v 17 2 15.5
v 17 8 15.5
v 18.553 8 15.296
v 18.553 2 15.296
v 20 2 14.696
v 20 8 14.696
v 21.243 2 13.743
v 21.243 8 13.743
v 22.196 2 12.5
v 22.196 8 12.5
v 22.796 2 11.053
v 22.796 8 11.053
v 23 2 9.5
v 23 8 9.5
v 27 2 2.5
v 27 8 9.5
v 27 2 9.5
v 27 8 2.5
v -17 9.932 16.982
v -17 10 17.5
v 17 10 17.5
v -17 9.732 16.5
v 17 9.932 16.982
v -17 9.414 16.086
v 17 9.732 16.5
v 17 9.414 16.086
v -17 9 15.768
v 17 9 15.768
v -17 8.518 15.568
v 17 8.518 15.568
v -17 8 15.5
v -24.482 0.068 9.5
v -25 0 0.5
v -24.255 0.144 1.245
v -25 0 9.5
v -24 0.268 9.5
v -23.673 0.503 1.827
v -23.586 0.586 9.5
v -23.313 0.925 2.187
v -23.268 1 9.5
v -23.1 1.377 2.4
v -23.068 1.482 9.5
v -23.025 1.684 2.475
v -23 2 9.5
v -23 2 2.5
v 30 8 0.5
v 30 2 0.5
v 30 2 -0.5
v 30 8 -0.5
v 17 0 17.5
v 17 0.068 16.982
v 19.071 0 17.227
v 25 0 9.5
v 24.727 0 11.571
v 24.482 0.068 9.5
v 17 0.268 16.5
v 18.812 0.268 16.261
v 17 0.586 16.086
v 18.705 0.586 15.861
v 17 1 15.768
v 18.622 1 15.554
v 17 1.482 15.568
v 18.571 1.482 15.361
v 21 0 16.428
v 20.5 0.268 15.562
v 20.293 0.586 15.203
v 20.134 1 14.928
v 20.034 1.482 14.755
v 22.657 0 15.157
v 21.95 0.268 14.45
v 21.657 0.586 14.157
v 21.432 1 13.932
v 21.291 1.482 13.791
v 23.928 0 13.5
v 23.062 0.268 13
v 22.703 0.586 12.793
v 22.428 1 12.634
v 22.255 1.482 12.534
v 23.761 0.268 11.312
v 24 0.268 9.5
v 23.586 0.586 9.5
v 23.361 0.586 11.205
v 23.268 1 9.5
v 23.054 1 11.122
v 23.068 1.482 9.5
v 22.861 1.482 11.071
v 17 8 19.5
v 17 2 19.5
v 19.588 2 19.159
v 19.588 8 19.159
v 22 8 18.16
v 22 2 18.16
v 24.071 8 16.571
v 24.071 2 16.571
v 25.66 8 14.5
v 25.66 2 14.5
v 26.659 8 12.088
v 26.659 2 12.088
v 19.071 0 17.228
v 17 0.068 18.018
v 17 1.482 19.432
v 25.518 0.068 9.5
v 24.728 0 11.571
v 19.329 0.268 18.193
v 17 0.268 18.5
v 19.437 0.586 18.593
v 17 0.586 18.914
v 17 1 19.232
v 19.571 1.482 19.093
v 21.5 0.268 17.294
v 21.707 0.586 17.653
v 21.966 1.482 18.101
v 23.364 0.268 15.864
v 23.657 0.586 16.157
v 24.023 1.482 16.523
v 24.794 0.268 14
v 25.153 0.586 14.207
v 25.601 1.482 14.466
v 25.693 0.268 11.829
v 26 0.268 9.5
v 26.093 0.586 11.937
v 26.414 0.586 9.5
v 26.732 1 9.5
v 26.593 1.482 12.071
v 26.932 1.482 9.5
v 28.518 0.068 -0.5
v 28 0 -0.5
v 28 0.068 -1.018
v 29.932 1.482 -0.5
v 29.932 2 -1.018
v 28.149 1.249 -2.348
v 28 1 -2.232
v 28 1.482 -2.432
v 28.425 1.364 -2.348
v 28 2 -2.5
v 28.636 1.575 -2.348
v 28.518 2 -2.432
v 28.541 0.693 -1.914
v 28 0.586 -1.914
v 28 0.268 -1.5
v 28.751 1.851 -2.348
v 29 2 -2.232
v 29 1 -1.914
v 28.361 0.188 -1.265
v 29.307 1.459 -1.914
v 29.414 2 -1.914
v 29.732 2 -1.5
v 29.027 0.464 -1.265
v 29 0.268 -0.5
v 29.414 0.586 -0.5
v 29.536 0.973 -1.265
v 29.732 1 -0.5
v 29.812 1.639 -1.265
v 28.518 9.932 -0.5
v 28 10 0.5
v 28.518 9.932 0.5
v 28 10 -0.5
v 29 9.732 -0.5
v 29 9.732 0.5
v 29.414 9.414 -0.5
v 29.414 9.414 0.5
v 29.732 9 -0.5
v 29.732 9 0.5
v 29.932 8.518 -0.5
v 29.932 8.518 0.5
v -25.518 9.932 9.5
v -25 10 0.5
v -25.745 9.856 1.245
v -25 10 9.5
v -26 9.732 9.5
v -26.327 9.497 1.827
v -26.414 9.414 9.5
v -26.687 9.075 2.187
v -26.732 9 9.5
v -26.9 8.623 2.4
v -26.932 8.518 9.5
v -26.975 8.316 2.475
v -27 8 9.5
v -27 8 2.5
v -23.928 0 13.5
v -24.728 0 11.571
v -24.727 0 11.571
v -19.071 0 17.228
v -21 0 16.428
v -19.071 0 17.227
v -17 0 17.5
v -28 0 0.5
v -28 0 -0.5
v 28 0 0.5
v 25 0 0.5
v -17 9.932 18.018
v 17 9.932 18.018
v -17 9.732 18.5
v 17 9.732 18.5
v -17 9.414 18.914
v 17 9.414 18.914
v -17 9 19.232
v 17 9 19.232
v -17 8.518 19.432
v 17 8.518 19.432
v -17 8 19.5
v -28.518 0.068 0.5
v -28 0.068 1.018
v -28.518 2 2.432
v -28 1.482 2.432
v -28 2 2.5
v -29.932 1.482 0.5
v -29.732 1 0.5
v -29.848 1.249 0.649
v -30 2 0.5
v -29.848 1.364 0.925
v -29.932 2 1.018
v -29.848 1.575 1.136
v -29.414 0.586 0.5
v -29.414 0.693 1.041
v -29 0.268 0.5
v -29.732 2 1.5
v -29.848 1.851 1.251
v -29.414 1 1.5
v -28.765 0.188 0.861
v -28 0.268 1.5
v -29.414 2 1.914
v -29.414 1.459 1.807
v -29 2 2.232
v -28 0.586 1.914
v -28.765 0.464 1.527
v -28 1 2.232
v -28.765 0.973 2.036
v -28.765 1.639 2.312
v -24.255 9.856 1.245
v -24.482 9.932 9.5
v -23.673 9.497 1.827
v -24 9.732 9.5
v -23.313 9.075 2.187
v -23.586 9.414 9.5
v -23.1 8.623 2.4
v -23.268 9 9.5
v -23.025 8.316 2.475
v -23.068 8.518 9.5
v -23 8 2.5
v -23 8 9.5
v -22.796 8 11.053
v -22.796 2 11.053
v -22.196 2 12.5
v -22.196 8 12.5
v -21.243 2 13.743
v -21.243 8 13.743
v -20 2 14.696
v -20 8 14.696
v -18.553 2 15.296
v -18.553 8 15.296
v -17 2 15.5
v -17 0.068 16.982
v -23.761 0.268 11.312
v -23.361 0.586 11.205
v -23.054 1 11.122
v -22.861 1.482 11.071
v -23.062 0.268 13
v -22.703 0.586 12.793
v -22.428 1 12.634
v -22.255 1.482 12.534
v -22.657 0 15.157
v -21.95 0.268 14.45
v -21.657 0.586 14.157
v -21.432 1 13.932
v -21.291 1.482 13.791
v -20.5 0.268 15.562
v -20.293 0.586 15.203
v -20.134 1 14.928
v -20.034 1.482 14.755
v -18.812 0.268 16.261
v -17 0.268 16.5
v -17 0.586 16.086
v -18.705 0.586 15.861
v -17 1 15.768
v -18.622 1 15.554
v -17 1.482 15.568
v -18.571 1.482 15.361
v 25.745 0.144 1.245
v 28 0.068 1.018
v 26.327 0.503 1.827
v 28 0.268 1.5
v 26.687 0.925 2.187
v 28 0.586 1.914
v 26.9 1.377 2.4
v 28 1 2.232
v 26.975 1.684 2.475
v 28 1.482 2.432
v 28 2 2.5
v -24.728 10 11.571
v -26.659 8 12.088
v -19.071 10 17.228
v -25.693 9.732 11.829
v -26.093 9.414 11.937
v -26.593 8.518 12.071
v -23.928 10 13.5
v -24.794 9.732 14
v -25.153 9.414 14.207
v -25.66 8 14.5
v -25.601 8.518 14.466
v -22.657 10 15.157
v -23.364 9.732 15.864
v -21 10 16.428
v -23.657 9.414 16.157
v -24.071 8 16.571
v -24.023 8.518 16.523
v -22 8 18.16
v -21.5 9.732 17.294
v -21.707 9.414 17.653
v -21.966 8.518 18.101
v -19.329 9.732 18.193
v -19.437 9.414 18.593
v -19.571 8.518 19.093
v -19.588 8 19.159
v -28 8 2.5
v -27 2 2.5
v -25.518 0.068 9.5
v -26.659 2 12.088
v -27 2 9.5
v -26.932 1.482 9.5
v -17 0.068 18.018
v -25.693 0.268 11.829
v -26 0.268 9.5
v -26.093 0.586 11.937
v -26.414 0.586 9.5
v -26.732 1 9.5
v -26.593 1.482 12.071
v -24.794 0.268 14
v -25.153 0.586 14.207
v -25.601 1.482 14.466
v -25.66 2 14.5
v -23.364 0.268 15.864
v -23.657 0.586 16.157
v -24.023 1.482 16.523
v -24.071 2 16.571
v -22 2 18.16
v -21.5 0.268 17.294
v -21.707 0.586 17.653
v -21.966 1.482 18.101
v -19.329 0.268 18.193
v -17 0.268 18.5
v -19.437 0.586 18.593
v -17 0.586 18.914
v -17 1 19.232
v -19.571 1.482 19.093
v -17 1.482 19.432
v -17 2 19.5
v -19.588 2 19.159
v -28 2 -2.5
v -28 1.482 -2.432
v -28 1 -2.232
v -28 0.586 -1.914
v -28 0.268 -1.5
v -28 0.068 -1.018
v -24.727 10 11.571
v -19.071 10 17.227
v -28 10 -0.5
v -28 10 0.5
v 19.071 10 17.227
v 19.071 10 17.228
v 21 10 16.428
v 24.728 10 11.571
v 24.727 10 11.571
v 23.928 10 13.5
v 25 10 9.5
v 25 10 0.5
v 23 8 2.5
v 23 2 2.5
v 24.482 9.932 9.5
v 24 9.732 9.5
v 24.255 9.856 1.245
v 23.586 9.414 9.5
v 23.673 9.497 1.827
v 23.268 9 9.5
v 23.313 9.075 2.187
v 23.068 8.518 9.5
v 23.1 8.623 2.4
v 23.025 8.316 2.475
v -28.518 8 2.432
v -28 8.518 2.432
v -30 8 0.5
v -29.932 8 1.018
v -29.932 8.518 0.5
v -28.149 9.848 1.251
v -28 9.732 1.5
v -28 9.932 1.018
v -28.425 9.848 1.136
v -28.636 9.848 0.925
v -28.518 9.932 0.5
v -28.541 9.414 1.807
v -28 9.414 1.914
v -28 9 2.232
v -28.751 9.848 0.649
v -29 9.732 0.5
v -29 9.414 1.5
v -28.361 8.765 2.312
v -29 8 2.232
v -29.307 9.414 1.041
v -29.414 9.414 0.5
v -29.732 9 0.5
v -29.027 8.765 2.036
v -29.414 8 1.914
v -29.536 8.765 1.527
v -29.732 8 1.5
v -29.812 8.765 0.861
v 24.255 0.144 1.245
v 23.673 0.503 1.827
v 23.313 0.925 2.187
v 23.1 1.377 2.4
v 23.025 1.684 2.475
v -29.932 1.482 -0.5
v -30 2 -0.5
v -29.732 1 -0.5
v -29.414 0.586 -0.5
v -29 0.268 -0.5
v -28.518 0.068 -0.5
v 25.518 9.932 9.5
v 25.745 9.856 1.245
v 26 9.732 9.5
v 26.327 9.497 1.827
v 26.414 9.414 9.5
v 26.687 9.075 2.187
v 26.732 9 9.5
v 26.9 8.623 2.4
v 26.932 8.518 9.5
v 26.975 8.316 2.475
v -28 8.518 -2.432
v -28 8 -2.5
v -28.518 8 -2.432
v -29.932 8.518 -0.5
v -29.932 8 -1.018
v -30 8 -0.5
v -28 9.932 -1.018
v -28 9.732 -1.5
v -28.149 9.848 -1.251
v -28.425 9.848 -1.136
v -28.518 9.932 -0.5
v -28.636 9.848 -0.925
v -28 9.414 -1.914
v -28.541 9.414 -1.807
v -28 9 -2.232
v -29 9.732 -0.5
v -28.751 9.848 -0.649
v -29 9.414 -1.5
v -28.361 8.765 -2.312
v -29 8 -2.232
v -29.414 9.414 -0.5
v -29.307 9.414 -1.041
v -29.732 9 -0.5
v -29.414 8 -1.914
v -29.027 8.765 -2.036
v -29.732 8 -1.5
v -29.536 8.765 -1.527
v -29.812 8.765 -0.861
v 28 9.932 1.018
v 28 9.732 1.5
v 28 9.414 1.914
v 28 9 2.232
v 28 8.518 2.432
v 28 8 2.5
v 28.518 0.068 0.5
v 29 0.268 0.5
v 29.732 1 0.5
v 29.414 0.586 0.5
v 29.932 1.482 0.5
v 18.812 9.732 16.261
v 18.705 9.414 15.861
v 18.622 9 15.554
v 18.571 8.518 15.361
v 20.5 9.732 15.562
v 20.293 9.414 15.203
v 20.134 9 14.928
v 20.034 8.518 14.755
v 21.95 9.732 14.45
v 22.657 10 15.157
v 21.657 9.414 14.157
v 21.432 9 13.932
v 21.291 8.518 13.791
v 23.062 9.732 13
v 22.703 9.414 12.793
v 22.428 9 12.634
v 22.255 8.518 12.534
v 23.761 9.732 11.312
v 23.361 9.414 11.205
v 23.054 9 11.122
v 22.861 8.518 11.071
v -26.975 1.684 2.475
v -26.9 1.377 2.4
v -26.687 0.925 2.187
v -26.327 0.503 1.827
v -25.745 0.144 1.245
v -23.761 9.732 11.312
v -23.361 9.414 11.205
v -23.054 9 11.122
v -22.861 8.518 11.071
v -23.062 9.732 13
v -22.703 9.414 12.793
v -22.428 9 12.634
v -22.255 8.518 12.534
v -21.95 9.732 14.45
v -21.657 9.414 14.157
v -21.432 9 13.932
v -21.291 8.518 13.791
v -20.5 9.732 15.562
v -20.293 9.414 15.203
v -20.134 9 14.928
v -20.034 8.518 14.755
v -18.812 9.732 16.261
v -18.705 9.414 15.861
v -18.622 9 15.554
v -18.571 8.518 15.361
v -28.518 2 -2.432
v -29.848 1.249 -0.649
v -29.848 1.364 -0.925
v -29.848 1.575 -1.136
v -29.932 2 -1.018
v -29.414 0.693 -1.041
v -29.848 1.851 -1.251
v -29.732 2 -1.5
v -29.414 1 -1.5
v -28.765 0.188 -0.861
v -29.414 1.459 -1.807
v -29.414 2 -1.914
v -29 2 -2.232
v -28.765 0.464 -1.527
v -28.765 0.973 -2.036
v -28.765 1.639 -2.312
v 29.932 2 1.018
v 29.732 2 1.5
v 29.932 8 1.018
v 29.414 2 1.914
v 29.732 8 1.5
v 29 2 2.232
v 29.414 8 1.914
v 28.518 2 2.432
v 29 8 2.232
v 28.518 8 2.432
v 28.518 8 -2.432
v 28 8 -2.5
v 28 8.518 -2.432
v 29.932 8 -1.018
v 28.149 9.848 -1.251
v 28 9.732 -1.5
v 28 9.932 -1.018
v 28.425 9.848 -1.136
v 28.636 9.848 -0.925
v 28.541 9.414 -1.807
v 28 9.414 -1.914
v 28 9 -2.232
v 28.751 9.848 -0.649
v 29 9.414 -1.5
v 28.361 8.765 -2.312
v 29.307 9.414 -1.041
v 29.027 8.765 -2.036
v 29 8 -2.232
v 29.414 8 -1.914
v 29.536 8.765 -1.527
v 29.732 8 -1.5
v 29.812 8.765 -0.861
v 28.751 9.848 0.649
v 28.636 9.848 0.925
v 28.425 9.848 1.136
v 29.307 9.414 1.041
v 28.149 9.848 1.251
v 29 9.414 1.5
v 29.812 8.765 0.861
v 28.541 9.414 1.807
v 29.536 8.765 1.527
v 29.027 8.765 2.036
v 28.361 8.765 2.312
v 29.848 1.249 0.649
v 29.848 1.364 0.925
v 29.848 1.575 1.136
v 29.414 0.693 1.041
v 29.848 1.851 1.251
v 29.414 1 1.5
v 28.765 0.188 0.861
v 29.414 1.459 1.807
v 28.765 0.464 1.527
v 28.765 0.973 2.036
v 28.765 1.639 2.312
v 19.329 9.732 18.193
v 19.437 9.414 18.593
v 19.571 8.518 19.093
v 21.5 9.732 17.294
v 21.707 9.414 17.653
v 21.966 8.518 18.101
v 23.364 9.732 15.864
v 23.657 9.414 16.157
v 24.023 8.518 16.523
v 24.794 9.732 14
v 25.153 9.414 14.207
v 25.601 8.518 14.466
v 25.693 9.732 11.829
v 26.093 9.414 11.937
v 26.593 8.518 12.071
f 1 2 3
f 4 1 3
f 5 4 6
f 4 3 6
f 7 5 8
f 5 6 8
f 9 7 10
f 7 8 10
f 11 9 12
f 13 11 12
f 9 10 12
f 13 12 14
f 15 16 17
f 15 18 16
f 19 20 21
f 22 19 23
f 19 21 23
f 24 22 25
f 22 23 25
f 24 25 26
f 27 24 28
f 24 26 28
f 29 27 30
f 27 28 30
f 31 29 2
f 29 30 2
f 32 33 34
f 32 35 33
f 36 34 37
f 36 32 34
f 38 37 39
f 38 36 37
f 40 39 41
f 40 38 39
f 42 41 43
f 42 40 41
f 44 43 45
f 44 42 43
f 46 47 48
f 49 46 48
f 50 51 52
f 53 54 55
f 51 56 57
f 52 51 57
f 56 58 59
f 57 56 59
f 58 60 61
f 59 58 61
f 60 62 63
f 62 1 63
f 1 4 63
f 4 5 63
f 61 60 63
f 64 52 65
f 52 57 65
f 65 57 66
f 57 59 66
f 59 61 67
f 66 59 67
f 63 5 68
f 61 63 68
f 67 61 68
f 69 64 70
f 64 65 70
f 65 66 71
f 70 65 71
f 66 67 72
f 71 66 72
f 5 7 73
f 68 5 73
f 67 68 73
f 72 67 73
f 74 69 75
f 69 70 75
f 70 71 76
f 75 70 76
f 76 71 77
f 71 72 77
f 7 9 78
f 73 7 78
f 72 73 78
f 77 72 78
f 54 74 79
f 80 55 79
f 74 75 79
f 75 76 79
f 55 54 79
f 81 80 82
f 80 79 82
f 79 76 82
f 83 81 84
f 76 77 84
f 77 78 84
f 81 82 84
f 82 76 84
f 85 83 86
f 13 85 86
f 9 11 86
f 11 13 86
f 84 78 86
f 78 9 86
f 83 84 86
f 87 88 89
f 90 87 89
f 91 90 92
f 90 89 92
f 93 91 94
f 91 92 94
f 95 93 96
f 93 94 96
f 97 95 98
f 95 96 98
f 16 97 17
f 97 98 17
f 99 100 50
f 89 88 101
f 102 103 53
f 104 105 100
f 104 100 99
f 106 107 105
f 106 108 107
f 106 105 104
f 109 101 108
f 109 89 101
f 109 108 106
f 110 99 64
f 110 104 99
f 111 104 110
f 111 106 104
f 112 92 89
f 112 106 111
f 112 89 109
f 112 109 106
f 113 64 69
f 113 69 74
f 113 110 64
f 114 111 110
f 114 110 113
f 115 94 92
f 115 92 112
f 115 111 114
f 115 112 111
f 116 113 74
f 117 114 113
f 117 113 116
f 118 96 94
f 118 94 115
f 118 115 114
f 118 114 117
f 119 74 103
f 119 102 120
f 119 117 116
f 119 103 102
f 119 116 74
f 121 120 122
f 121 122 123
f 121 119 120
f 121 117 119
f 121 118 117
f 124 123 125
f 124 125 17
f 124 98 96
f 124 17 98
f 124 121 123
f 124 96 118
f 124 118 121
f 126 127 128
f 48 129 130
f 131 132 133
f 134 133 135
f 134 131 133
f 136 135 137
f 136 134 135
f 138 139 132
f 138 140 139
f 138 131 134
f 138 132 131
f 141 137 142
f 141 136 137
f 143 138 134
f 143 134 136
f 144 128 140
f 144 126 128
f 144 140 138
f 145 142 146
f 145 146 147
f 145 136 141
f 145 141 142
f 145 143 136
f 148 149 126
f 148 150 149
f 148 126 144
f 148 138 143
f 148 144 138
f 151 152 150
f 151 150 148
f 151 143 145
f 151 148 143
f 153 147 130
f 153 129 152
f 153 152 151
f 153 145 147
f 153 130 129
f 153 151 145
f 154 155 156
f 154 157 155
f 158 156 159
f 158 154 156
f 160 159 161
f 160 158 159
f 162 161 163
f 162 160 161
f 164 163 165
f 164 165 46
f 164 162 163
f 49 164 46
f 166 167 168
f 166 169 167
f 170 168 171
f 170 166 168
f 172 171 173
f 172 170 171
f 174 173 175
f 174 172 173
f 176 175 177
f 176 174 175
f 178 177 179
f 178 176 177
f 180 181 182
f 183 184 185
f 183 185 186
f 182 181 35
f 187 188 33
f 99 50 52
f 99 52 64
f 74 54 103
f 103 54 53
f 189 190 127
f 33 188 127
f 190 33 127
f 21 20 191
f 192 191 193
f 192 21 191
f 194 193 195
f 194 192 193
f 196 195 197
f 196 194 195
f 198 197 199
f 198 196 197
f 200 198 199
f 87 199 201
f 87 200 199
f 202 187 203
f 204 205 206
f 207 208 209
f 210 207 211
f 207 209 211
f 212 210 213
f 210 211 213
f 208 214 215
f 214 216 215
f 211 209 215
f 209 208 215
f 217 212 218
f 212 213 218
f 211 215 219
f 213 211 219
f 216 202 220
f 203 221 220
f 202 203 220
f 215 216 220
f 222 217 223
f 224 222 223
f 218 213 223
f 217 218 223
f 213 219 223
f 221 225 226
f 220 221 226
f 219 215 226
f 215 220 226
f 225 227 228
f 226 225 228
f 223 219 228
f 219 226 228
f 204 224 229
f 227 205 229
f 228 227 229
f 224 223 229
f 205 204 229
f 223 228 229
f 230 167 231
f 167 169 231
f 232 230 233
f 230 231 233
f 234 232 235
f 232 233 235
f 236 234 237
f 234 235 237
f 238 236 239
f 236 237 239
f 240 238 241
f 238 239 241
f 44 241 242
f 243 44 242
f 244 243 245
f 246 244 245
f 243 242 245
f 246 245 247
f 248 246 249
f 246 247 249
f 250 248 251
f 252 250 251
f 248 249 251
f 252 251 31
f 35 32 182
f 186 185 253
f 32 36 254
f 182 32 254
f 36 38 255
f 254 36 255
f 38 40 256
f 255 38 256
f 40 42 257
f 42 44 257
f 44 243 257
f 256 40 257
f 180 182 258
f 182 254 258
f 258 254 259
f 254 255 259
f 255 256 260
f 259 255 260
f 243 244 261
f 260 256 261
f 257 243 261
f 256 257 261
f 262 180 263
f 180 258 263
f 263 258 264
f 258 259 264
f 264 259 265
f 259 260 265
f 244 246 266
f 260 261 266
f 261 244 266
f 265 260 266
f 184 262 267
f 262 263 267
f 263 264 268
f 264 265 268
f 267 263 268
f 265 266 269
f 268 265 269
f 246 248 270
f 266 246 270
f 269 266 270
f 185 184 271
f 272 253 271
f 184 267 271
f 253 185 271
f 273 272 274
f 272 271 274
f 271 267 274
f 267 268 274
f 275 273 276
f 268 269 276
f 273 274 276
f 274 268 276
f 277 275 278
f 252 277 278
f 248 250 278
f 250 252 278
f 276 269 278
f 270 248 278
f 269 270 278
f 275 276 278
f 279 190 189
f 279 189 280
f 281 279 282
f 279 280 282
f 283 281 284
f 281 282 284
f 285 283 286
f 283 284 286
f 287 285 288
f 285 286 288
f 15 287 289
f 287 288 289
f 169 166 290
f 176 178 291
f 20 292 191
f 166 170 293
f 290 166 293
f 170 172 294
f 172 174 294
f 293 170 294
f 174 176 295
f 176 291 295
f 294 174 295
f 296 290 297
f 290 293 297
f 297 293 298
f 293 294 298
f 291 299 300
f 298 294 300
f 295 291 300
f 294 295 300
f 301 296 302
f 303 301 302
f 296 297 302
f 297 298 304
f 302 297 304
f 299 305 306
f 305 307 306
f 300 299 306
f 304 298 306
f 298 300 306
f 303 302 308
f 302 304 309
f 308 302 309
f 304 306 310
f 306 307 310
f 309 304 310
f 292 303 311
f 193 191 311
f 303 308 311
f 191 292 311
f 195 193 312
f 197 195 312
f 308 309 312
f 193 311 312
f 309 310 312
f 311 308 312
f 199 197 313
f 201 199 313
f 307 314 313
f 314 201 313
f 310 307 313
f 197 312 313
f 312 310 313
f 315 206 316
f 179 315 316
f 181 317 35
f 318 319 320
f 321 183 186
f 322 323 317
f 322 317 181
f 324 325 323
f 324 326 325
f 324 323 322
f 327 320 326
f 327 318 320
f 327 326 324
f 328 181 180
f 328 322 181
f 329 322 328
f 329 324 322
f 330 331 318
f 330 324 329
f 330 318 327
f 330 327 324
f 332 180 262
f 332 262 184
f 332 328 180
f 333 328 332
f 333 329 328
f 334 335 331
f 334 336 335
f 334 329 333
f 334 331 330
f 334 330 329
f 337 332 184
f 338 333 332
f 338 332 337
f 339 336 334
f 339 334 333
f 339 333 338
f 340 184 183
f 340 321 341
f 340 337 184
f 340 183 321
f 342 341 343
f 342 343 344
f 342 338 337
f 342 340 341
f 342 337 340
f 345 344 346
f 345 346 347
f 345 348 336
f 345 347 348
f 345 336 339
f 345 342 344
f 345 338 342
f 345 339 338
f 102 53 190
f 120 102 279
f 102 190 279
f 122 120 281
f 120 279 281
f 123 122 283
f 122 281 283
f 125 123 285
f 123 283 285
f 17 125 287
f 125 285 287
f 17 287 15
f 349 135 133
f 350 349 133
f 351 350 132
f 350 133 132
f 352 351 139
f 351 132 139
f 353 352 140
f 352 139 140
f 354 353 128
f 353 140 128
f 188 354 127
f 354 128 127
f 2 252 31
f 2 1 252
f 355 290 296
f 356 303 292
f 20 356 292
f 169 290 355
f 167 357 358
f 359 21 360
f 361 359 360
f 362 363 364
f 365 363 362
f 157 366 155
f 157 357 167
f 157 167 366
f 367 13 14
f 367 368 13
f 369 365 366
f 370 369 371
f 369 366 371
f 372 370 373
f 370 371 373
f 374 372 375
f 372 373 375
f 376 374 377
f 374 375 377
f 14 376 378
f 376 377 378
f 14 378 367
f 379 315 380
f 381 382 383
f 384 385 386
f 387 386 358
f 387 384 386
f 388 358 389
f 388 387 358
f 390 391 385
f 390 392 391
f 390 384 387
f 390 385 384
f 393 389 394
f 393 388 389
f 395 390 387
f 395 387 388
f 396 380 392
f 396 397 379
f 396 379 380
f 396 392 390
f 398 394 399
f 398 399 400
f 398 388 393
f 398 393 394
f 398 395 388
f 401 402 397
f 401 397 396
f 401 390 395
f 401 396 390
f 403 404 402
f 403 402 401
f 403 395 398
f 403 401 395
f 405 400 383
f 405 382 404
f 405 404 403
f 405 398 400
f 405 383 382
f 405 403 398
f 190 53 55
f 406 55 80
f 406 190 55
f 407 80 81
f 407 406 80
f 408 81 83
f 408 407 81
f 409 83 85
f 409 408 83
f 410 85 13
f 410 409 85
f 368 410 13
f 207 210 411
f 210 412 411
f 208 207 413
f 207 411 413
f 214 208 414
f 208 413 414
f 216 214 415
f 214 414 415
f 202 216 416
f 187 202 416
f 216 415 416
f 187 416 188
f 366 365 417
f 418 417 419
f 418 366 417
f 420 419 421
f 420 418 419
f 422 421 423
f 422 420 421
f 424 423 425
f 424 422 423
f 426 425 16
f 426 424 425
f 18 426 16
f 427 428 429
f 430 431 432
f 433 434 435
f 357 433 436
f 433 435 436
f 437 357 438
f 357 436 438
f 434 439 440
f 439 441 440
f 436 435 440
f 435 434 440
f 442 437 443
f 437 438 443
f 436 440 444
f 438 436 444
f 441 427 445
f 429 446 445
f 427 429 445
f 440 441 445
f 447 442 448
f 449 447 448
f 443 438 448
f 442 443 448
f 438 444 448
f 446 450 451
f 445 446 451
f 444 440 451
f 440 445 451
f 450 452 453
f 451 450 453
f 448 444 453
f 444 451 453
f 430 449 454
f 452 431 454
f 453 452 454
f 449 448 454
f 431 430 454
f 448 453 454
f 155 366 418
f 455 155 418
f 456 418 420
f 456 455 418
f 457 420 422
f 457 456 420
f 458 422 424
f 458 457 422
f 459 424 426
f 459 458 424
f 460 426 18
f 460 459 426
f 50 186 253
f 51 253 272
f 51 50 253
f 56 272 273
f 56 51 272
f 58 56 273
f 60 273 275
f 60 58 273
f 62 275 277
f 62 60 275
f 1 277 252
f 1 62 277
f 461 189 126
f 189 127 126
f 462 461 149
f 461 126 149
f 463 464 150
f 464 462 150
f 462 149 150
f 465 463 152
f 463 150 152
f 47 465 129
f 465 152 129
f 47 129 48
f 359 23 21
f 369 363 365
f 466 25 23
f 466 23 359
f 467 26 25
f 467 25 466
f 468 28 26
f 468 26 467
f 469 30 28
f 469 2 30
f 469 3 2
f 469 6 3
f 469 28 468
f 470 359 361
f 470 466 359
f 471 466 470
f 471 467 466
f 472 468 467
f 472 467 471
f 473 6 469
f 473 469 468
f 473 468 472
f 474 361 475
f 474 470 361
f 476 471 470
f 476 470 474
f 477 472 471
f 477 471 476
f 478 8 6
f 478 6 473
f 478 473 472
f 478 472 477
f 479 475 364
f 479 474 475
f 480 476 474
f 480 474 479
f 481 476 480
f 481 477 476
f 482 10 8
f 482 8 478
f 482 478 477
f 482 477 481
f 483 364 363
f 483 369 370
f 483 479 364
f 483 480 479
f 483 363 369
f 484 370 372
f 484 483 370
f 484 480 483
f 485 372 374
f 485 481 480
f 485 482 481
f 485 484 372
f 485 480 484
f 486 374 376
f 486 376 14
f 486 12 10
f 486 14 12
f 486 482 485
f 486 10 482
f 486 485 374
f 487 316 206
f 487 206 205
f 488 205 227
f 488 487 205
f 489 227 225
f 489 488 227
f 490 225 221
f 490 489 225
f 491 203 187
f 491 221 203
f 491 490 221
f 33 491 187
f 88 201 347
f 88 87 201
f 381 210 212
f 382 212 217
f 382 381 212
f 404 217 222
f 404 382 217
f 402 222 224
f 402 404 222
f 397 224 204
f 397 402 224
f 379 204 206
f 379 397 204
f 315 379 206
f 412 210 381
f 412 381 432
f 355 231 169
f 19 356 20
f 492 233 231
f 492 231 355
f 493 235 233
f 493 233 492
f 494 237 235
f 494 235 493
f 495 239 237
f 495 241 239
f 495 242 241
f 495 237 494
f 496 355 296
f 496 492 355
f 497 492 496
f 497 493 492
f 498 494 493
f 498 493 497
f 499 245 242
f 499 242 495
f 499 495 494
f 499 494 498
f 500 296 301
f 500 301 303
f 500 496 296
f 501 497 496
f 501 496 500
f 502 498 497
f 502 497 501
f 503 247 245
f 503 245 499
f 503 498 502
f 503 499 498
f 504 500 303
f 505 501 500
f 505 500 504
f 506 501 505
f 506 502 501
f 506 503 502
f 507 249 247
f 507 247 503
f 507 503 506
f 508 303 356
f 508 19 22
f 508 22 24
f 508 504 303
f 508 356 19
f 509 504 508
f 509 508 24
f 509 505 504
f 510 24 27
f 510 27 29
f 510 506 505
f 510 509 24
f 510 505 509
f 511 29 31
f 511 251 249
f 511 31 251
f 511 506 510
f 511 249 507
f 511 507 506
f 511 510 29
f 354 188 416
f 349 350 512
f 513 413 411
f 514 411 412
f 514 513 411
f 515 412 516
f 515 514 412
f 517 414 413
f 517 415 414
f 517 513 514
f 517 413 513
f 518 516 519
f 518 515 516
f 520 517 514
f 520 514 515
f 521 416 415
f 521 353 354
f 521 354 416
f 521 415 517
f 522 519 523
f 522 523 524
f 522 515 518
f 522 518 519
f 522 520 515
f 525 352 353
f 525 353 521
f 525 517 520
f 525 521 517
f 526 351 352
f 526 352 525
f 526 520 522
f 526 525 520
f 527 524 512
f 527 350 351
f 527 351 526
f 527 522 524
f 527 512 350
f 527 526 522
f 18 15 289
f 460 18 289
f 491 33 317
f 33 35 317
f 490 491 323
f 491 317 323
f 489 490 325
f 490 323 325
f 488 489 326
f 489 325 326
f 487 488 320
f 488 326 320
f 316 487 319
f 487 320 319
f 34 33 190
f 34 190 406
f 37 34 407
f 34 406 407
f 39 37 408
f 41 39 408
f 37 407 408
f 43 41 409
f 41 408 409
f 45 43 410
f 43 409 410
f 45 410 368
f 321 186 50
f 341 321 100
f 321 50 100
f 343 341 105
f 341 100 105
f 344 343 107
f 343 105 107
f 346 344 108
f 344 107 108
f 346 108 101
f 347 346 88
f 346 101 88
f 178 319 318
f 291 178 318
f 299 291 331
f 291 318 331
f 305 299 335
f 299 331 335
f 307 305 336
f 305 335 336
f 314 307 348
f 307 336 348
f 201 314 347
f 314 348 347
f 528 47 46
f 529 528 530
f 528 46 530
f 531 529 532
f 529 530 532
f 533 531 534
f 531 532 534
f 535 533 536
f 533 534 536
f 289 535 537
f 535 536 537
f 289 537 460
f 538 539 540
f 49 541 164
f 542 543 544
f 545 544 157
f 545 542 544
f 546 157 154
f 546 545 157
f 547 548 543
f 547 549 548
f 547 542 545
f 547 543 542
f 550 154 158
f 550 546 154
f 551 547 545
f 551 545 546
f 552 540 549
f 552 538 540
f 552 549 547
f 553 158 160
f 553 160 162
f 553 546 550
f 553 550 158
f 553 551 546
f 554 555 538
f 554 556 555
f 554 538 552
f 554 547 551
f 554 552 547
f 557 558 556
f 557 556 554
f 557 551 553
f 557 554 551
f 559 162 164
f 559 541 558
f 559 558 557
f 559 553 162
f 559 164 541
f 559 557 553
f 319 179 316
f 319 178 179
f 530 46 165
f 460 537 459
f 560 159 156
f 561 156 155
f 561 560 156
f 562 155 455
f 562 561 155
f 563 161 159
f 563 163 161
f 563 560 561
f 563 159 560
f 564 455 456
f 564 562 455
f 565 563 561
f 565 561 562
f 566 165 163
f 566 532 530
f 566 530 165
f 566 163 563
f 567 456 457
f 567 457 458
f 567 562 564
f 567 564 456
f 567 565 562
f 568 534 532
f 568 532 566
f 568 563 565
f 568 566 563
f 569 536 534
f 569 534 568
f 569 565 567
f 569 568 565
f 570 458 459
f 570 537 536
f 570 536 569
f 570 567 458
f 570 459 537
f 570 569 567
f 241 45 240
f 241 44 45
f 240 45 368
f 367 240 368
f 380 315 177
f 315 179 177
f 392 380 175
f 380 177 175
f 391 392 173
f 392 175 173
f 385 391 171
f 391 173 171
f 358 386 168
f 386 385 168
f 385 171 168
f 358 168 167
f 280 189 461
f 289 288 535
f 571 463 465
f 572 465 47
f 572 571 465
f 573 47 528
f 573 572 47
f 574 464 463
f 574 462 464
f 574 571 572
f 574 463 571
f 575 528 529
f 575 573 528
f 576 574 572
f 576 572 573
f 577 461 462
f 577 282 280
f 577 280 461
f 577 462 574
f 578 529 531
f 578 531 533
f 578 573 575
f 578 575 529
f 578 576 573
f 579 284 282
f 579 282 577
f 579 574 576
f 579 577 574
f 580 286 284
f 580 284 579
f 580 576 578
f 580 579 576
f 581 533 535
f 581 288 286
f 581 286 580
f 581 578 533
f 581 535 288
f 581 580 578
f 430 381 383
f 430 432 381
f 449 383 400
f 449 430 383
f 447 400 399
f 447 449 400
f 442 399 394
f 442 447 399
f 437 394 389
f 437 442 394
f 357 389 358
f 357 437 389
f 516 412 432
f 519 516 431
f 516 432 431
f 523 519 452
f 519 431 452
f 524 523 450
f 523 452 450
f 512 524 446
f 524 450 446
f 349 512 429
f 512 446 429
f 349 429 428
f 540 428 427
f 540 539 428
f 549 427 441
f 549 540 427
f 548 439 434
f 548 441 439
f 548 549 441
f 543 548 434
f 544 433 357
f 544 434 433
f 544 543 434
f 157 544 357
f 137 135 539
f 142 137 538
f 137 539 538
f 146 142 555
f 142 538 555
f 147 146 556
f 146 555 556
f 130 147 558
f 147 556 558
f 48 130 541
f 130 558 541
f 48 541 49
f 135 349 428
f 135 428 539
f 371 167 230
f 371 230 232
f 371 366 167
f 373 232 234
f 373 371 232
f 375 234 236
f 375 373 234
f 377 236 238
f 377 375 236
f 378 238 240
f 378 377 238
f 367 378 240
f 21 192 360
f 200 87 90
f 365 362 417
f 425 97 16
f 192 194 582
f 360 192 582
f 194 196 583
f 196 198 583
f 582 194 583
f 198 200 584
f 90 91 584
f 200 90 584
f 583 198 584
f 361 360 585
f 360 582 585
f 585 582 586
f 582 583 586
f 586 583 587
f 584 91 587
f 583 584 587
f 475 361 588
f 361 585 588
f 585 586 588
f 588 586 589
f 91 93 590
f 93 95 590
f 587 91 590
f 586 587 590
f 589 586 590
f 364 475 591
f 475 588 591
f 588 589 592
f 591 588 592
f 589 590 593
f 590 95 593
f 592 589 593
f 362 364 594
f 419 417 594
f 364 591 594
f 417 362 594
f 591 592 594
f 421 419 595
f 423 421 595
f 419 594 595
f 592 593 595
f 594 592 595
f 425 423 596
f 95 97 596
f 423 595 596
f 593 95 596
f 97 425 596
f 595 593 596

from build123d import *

# Parameters (mm, degrees)
SKETCH1_W           = 60
SKETCH1_H           = 5
BOSS_EXTRUDE1_DEPTH = 10
SKETCH2_W           = 4
SKETCH2_H           = 10
FILLET1_R           = 2


with BuildPart() as part:
    # Sketch1 → Boss-Extrude1 (new body)
    with BuildSketch(Plane(origin=(0, 0, 0), x_dir=(1, 0, 0), z_dir=(0, 1, 0))):
        Rectangle(SKETCH1_W, SKETCH1_H)
    extrude(amount=BOSS_EXTRUDE1_DEPTH)

    # Sweep6: sweep along a curve in space
    with BuildLine() as sweep6_path:
        Line((-25, 5, 2.5), (-25, 5, 9.5))
        ThreePointArc((-25, 5, 9.5), (-22.656854249, 5, 15.156854249), (-17, 5, 17.5))
        Line((-17, 5, 17.5), (17, 5, 17.5))
        ThreePointArc((17, 5, 17.5), (22.656854249, 5, 15.156854249), (25, 5, 9.5))
        Line((25, 5, 2.5), (25, 5, 9.5))
    # Sketch2 → Sweep6 (sweep)
    with BuildSketch(Plane.XY.offset(2.5)):
        with Locations((-25, 5)):
            Rectangle(SKETCH2_W, SKETCH2_H)
    sweep(path=sweep6_path.line)

    # Fillet1
    fillet1_edges = [part.edges().sort_by_distance(p)[0] for p in [
        (-21.242640687, 0, 13.742640687),
        (0, 0, 15.5),
        (21.242640687, 0, 13.742640687),
        (-24.071067812, 0, 16.571067812),
        (0, 0, 19.5),
        (24.071067812, 0, 16.571067812),
        (-28.5, 0, 2.5),
        (-27, 0, 6),
        (-27, 10, 6),
        (-23, 0, 6),
        (0, 0, 2.5),
        (23, 0, 6),
        (27, 0, 6),
        (27, 10, 6),
        (28.5, 0, 2.5),
        (30, 0, 0),
        (0, 0, -2.5),
        (-30, 0, 0),
        (-24.071067812, 10, 16.571067812),
        (24.071067812, 10, 16.571067812),
        (-21.242640687, 10, 13.742640687),
        (21.242640687, 10, 13.742640687),
        (-30, 5, -2.5),
        (-30, 5, 2.5),
        (30, 5, 2.5),
        (30, 5, -2.5),
        (0, 10, -2.5),
        (30, 10, 0),
        (28.5, 10, 2.5),
        (23, 10, 6),
        (0, 10, 2.5),
        (-23, 10, 6),
        (-28.5, 10, 2.5),
        (-30, 10, 0),
        (0, 10, 19.5),
        (0, 10, 15.5),
    ]]
    fillet(fillet1_edges, radius=FILLET1_R - 0.0001)  # a hair under: the kernel refuses the full size


solid = part.part
